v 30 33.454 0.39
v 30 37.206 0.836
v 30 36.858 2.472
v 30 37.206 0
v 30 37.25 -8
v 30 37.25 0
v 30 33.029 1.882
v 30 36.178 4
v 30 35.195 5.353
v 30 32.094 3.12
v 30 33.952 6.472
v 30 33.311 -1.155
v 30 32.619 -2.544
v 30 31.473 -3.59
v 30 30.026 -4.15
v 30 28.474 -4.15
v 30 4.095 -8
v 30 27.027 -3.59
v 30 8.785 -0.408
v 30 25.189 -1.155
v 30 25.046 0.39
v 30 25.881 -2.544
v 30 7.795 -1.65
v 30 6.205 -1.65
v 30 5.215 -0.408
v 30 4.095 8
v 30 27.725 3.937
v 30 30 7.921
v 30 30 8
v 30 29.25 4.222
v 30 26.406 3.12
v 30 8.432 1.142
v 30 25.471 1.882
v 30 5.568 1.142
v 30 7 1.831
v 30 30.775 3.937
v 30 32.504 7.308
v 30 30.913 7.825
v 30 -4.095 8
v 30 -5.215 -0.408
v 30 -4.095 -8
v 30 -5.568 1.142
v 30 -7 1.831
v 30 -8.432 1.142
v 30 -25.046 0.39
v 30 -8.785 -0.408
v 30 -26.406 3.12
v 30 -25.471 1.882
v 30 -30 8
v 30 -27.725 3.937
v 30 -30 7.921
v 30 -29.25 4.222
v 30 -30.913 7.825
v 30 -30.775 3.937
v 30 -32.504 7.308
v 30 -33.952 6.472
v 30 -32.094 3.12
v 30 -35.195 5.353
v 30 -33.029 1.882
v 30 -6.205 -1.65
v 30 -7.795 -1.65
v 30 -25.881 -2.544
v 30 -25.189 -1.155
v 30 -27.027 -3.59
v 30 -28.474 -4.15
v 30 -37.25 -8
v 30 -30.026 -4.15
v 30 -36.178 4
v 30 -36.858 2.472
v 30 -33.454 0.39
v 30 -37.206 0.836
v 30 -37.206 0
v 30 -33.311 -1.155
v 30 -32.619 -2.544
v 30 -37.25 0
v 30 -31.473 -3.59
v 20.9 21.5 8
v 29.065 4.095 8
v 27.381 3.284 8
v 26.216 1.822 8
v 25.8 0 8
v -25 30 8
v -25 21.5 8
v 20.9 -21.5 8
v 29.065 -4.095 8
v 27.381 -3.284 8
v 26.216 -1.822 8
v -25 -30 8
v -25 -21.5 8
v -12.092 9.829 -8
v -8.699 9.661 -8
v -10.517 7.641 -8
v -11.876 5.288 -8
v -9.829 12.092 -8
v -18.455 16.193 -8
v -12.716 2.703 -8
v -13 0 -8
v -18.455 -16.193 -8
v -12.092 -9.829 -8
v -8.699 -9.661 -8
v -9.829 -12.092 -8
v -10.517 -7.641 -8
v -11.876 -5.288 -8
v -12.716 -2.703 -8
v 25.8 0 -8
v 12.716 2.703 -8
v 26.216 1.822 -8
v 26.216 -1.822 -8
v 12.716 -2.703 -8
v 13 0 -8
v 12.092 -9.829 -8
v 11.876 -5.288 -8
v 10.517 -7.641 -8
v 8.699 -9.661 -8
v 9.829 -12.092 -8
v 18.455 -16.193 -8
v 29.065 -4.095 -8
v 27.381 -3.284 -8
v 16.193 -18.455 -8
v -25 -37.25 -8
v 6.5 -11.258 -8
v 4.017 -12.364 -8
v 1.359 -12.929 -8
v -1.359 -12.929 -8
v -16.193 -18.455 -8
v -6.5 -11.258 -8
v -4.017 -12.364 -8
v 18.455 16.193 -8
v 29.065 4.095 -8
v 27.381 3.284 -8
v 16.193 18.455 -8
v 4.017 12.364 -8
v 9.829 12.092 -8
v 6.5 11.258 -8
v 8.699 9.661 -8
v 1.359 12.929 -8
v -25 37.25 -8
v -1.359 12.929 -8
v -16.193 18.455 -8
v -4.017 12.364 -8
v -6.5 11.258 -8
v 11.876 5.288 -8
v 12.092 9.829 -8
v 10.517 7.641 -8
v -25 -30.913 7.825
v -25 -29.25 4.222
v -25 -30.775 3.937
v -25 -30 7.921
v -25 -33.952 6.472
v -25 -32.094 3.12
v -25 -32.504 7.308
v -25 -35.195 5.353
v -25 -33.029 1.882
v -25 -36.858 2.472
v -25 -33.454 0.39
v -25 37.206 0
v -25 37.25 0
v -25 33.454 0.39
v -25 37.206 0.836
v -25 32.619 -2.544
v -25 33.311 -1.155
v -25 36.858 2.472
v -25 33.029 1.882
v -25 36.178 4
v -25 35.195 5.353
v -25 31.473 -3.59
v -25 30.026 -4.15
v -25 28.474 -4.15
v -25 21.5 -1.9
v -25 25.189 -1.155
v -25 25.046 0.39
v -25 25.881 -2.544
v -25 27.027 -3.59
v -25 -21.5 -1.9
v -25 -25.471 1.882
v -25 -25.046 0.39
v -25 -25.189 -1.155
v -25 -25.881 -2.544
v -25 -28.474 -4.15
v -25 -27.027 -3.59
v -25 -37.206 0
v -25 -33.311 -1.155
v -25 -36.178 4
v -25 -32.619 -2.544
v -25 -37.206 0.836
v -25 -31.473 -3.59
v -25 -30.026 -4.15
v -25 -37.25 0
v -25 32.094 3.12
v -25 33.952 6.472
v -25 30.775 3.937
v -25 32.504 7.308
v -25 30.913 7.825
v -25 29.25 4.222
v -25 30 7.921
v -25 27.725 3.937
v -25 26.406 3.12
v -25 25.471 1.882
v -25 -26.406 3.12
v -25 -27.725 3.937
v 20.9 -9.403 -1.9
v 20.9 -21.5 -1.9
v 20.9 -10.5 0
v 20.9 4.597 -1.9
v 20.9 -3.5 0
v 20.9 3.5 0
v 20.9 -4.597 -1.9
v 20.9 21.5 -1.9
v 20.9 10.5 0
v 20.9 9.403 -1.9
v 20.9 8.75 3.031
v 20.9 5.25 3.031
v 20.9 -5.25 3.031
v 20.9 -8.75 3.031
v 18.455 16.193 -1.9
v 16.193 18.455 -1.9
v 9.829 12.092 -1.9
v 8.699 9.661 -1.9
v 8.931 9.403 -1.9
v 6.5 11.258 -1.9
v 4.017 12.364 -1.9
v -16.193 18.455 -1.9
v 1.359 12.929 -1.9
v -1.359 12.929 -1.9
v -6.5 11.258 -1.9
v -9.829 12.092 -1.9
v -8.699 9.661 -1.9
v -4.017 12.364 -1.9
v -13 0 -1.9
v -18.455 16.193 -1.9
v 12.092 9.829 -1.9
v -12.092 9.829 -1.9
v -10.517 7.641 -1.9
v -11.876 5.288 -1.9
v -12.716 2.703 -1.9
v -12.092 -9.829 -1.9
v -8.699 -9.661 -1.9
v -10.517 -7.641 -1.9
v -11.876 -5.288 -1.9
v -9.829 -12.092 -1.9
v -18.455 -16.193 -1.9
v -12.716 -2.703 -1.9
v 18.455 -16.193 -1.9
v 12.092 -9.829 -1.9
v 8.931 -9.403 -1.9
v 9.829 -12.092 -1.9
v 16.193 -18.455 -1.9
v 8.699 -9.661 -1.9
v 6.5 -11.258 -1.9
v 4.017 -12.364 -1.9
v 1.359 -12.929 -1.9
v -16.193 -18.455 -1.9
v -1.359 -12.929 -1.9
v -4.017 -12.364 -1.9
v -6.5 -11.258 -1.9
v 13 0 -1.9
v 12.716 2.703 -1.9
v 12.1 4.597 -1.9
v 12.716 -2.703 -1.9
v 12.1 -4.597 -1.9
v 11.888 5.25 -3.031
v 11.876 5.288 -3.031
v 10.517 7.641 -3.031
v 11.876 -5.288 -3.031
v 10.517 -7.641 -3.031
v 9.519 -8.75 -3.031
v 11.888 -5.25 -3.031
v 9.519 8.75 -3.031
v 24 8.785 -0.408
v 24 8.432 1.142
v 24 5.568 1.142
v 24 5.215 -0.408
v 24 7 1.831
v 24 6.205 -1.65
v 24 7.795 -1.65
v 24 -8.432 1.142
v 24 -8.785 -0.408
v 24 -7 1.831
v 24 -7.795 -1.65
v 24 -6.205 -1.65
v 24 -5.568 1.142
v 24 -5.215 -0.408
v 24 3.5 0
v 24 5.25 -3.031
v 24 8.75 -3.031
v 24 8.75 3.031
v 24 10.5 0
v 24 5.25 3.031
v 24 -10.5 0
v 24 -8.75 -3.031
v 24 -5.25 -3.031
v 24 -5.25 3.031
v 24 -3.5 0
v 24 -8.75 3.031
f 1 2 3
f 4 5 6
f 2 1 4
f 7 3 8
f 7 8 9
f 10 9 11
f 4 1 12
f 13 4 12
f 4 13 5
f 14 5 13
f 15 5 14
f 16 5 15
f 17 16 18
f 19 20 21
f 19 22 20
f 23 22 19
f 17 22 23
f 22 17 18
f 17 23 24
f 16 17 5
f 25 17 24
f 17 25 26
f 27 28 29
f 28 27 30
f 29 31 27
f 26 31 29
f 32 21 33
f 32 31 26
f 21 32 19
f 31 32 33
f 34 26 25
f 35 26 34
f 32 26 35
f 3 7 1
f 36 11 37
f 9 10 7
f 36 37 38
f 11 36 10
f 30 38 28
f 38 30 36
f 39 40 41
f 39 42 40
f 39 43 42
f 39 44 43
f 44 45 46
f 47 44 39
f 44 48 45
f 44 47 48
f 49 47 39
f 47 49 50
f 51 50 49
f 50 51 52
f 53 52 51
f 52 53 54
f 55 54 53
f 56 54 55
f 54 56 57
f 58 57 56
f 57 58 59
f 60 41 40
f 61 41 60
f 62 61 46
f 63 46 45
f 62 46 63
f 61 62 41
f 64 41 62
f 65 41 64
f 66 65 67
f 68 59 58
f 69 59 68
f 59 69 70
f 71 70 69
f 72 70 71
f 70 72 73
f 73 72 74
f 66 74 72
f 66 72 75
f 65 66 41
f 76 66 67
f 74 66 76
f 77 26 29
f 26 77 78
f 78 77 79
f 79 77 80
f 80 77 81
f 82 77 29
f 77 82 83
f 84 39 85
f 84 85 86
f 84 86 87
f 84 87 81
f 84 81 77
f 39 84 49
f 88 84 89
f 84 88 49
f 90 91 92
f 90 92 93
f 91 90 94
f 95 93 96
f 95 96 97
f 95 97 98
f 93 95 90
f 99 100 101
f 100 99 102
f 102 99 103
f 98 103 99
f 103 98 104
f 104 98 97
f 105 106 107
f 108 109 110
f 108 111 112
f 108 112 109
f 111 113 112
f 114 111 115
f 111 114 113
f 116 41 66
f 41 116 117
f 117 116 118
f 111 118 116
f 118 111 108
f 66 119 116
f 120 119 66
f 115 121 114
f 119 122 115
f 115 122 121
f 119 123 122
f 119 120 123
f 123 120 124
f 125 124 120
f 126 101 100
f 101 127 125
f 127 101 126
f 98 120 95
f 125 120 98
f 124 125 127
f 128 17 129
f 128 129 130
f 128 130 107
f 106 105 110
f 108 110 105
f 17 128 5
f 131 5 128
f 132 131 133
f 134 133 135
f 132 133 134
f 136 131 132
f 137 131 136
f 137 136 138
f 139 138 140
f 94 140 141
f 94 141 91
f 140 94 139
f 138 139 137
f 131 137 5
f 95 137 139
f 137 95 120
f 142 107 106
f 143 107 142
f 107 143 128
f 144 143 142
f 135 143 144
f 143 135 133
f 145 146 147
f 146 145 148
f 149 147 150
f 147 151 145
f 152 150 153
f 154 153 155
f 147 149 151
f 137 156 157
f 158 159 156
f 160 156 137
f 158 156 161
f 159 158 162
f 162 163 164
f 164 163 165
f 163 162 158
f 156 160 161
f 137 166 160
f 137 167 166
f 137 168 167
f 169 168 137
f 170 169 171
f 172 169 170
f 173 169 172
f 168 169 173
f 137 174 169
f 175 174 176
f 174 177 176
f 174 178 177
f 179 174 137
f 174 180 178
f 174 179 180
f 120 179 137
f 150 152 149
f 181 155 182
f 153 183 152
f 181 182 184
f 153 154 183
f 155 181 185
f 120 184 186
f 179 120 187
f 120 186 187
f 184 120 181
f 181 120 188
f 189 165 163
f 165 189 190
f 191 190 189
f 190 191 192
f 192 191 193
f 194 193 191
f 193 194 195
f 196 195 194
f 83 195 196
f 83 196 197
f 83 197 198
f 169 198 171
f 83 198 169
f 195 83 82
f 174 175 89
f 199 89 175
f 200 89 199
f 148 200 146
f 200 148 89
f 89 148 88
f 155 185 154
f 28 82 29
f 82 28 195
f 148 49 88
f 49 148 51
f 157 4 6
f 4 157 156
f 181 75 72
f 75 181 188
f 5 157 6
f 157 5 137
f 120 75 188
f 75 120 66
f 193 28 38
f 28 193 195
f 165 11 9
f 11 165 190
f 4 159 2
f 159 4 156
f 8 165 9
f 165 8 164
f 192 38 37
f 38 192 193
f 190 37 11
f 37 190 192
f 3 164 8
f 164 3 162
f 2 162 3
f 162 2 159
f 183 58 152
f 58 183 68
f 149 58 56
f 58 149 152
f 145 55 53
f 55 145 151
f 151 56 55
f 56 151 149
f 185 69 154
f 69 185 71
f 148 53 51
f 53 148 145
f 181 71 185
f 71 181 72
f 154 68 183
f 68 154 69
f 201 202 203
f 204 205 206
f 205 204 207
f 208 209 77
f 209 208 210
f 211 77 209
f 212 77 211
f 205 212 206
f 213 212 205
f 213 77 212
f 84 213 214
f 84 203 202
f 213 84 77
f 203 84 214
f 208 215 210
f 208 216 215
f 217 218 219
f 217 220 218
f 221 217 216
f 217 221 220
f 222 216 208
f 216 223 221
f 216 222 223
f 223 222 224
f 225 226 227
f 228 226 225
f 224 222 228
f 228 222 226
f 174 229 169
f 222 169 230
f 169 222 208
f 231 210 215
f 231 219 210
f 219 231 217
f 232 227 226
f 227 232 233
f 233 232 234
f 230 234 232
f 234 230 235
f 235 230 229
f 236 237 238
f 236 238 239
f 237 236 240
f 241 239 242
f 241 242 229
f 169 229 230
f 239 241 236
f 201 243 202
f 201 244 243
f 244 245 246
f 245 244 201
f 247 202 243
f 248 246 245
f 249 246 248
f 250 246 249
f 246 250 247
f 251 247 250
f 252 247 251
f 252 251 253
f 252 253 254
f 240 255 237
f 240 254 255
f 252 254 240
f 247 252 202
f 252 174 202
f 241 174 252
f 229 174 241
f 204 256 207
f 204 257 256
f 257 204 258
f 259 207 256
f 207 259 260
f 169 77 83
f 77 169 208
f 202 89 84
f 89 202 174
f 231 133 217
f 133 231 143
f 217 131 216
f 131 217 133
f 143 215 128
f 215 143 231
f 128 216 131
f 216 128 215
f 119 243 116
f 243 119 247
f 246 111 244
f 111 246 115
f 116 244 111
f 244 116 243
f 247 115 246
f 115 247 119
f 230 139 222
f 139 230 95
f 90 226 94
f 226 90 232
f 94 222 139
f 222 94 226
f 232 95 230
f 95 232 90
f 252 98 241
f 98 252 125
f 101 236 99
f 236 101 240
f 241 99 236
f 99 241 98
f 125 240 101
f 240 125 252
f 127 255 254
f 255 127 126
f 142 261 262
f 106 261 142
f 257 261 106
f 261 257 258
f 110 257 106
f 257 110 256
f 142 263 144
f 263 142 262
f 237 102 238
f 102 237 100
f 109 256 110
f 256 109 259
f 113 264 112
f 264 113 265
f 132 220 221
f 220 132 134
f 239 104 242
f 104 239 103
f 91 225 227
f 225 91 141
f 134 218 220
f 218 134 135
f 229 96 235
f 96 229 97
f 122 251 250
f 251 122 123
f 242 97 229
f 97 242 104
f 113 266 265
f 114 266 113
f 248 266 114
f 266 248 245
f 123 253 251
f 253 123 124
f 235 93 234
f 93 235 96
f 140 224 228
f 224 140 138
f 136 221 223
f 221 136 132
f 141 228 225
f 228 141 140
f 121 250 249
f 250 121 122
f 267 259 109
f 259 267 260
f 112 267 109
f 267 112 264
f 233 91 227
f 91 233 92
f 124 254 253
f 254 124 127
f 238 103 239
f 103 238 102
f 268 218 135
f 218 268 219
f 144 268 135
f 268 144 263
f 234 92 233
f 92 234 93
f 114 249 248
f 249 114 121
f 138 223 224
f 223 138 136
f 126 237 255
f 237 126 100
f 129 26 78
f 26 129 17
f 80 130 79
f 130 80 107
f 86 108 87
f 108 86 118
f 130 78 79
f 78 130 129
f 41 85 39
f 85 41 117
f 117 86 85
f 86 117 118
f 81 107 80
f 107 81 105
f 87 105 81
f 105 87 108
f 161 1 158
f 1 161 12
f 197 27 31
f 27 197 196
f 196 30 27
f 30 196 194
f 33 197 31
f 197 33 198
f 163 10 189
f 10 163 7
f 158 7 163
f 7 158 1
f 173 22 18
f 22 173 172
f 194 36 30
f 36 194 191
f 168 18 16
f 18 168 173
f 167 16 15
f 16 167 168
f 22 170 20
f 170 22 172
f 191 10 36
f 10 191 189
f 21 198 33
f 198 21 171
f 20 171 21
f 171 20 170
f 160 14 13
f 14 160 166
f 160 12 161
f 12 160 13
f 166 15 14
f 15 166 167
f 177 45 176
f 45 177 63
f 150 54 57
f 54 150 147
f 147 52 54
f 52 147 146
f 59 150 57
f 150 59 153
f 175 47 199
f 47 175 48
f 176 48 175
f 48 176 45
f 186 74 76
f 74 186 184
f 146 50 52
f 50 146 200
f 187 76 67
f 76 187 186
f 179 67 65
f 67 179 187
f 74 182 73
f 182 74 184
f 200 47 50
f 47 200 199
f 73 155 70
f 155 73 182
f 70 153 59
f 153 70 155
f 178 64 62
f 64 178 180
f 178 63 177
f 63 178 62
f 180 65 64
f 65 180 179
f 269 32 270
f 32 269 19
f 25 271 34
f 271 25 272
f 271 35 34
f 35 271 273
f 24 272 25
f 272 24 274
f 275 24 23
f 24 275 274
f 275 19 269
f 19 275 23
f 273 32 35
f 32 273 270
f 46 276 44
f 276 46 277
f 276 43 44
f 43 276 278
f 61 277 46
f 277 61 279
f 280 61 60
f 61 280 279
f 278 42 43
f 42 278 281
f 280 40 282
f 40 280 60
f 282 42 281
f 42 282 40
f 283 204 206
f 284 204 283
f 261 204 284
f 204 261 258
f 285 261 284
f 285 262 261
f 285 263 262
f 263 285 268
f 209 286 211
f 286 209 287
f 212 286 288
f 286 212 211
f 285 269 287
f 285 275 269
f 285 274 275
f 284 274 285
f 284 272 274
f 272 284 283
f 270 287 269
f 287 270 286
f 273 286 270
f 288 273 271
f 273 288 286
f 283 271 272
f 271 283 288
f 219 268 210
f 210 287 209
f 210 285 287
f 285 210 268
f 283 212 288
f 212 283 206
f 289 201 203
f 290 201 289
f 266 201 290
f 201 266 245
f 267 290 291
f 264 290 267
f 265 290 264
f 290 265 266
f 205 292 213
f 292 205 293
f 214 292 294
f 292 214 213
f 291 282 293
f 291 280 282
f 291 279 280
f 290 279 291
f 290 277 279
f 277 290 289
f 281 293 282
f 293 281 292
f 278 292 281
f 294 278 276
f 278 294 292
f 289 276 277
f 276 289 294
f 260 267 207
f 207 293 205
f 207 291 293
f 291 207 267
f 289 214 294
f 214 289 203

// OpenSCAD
// file: configuration.scad
// PRUSA Mendel  
// Configuration file
// GNU GPL v2
// Josef Průša
// josefprusa@me.com
// prusadjs.cz
// http://www.reprap.org/wiki/Prusa_Mendel
// http://github.com/prusajr/PrusaMendel

// PLEASE SELECT ONE OF THE CONFIGURATIONS BELOW
// BY UN-COMMENTING IT

variant=0; //0 for metric
//variant=1; //1 for SAE
if(variant==0){
echo("variant: metric");
}else if(variant==1){
echo("variant: sae");
} else{
echo("WARNING: INVALID CONFIGURATION");
}


vars=[
//[m8_dia, m8_nut, m4_dia, m4_nut, m3_dia, m3_nut, bush_dia, mot_shaft, bush_rod, bush_outerdia, bush_length]
[8.3,16.4,4.3,9,3.3,7,11,5.3,8,16,11],//metric
[9,15.7,5.5,10.6,5.5,10.6,11.5,5.3,7.9375,16,11]//SAE
];

//BUSHING TYPE Can generate three versions
// 1 - regular old ones
// 2 - helical ones
// 3 - holders for brass or any other bought bushings
bushing_type = 2;

//Round corner diameter
round_corner_diameter = 8;

//X end parameters
axis_diameter_real = 4;
axis_diameter_larger = 4.2 ;
pressure_pad_height = 0.7;

//Thin wall size
layer_height = 0.4;
perimeter_width_over_thicknes = 1.6;
infill_widht_over_thickness = 1.55;
thin_wall = 2*(perimeter_width_over_thicknes*layer_height+infill_widht_over_thickness*layer_height);
if(thin_wall<2){
	echo("Check thin wall size, its below 2mm!");
}
echo(thin_wall);

//DO NOT TOUCH THIS SECTION!
m8_diameter = vars[variant][0];
m8_nut_diameter = vars[variant][1];
m4_diameter = vars[variant][2];
m4_nut_diameter = vars[variant][3];
m3_diameter = vars[variant][4];
m3_nut_diameter = vars[variant][5];
bushing_diameter = vars[variant][6];
motor_shaft=vars[variant][7];
bushing_rodsize = vars[variant][8];
bushing_outerDiameter = vars[variant][9];
bushing_lenght = vars[variant][10];


// MINI-HUXLEY VERSION (TODO, just place holder)
// include <configuration-huxley.scad>

// MEGA VERSION (TODO, just place holder)
// include <configuration-mega.scad>


// Some basic functions, probably should be somewhere else
module roundcorner(diameter){
	difference(){
		cube(size = [diameter,diameter,99], center = false);
		translate(v = [diameter, diameter, 0]) cylinder(h = 100, r=diameter, center=true);
	}
}
module polyhole(h, d) {
    n = max(round(2 * d),3);
    rotate([0,0,180])
        cylinder(h = h, r = (d / 2) / cos (180 / n), $fn = n);
}
// main file
// PRUSA Mendel  
// Z motor mount
// Used for mounting Z motors
// GNU GPL v2
// Josef Průša
// josefprusa@me.com
// prusadjs.cz
// http://www.reprap.org/wiki/Prusa_Mendel
// http://github.com/prusajr/PrusaMendel
include <configuration.scad>

/**
 * @name Z motor mount
 * @category Printed
 * @using 2 m3x25
 * @using 2 m3nut
 * @using 2 m3washer
 * @using 2 m8nut
 * @using 2 m8washer
 */
 
module zmotormount(){
difference(){
union(){
translate(v=[2.5,0,0]) cube(size = [55,60,16], center = true);
translate(v=[2.5,0,-4]) cube(size = [55,74.5,8], center = true);
translate(v=[-25,29.25,0]) rotate(a=[0,90,0]) cylinder(h = 55, r=8, $fn=30);
translate(v=[-25,-29.25,0]) rotate(a=[0,90,0]) cylinder(h = 55, r=8, $fn=30);
}
translate(v=[-2.1,0,3.1]) cube(size = [46,43,10], center = true);

// Nema 17
rotate ([0,0,45]) translate([20,0,0]) cube(size = [9,3.2,25], center = true);
rotate ([0,0,-45]) translate([20,0,0]) cube(size = [9,3.2,25], center = true);
rotate ([0,0,135]) translate([20,0,0]) cube(size = [9,3.2,25], center = true);
rotate ([0,0,-135]) translate([20,0,0]) cube(size = [9,3.2,25], center = true);
translate(v=[0,0,-10])cylinder(h = 20, r=13);

translate(v=[30,0,-10]) cylinder(h = 20, r=4.2);
translate(v=[-26,29.25,0]) rotate(a=[0,90,0]) //cylinder(h = 58, r=m8_diameter/2);
	polyhole(58,m8_diameter);
translate(v=[-26,-29.25,0]) rotate(a=[0,90,0]) //cylinder(h = 58, r=m8_diameter/2);
	polyhole(58,m8_diameter);


translate(v=[16,7,0]) rotate(a=[0,90,0]) //cylinder(h = 15, r=m3_diameter/2);
	polyhole(15,m3_diameter);
translate(v=[16,-7,0]) rotate(a=[0,90,0]) //cylinder(h = 15, r=m3_diameter/2);
	polyhole(15,m3_diameter);
translate(v=[0,7,0]) rotate(a=[0,90,0]) rotate(a=[0,0,30]) cylinder(h = 24, r=m3_nut_diameter/2,$fn =6);
translate(v=[0,-7,0]) rotate(a=[0,90,0]) rotate(a=[0,0,30]) cylinder(h = 24, r=m3_nut_diameter/2, $fn=6);

}
}
zmotormount();
